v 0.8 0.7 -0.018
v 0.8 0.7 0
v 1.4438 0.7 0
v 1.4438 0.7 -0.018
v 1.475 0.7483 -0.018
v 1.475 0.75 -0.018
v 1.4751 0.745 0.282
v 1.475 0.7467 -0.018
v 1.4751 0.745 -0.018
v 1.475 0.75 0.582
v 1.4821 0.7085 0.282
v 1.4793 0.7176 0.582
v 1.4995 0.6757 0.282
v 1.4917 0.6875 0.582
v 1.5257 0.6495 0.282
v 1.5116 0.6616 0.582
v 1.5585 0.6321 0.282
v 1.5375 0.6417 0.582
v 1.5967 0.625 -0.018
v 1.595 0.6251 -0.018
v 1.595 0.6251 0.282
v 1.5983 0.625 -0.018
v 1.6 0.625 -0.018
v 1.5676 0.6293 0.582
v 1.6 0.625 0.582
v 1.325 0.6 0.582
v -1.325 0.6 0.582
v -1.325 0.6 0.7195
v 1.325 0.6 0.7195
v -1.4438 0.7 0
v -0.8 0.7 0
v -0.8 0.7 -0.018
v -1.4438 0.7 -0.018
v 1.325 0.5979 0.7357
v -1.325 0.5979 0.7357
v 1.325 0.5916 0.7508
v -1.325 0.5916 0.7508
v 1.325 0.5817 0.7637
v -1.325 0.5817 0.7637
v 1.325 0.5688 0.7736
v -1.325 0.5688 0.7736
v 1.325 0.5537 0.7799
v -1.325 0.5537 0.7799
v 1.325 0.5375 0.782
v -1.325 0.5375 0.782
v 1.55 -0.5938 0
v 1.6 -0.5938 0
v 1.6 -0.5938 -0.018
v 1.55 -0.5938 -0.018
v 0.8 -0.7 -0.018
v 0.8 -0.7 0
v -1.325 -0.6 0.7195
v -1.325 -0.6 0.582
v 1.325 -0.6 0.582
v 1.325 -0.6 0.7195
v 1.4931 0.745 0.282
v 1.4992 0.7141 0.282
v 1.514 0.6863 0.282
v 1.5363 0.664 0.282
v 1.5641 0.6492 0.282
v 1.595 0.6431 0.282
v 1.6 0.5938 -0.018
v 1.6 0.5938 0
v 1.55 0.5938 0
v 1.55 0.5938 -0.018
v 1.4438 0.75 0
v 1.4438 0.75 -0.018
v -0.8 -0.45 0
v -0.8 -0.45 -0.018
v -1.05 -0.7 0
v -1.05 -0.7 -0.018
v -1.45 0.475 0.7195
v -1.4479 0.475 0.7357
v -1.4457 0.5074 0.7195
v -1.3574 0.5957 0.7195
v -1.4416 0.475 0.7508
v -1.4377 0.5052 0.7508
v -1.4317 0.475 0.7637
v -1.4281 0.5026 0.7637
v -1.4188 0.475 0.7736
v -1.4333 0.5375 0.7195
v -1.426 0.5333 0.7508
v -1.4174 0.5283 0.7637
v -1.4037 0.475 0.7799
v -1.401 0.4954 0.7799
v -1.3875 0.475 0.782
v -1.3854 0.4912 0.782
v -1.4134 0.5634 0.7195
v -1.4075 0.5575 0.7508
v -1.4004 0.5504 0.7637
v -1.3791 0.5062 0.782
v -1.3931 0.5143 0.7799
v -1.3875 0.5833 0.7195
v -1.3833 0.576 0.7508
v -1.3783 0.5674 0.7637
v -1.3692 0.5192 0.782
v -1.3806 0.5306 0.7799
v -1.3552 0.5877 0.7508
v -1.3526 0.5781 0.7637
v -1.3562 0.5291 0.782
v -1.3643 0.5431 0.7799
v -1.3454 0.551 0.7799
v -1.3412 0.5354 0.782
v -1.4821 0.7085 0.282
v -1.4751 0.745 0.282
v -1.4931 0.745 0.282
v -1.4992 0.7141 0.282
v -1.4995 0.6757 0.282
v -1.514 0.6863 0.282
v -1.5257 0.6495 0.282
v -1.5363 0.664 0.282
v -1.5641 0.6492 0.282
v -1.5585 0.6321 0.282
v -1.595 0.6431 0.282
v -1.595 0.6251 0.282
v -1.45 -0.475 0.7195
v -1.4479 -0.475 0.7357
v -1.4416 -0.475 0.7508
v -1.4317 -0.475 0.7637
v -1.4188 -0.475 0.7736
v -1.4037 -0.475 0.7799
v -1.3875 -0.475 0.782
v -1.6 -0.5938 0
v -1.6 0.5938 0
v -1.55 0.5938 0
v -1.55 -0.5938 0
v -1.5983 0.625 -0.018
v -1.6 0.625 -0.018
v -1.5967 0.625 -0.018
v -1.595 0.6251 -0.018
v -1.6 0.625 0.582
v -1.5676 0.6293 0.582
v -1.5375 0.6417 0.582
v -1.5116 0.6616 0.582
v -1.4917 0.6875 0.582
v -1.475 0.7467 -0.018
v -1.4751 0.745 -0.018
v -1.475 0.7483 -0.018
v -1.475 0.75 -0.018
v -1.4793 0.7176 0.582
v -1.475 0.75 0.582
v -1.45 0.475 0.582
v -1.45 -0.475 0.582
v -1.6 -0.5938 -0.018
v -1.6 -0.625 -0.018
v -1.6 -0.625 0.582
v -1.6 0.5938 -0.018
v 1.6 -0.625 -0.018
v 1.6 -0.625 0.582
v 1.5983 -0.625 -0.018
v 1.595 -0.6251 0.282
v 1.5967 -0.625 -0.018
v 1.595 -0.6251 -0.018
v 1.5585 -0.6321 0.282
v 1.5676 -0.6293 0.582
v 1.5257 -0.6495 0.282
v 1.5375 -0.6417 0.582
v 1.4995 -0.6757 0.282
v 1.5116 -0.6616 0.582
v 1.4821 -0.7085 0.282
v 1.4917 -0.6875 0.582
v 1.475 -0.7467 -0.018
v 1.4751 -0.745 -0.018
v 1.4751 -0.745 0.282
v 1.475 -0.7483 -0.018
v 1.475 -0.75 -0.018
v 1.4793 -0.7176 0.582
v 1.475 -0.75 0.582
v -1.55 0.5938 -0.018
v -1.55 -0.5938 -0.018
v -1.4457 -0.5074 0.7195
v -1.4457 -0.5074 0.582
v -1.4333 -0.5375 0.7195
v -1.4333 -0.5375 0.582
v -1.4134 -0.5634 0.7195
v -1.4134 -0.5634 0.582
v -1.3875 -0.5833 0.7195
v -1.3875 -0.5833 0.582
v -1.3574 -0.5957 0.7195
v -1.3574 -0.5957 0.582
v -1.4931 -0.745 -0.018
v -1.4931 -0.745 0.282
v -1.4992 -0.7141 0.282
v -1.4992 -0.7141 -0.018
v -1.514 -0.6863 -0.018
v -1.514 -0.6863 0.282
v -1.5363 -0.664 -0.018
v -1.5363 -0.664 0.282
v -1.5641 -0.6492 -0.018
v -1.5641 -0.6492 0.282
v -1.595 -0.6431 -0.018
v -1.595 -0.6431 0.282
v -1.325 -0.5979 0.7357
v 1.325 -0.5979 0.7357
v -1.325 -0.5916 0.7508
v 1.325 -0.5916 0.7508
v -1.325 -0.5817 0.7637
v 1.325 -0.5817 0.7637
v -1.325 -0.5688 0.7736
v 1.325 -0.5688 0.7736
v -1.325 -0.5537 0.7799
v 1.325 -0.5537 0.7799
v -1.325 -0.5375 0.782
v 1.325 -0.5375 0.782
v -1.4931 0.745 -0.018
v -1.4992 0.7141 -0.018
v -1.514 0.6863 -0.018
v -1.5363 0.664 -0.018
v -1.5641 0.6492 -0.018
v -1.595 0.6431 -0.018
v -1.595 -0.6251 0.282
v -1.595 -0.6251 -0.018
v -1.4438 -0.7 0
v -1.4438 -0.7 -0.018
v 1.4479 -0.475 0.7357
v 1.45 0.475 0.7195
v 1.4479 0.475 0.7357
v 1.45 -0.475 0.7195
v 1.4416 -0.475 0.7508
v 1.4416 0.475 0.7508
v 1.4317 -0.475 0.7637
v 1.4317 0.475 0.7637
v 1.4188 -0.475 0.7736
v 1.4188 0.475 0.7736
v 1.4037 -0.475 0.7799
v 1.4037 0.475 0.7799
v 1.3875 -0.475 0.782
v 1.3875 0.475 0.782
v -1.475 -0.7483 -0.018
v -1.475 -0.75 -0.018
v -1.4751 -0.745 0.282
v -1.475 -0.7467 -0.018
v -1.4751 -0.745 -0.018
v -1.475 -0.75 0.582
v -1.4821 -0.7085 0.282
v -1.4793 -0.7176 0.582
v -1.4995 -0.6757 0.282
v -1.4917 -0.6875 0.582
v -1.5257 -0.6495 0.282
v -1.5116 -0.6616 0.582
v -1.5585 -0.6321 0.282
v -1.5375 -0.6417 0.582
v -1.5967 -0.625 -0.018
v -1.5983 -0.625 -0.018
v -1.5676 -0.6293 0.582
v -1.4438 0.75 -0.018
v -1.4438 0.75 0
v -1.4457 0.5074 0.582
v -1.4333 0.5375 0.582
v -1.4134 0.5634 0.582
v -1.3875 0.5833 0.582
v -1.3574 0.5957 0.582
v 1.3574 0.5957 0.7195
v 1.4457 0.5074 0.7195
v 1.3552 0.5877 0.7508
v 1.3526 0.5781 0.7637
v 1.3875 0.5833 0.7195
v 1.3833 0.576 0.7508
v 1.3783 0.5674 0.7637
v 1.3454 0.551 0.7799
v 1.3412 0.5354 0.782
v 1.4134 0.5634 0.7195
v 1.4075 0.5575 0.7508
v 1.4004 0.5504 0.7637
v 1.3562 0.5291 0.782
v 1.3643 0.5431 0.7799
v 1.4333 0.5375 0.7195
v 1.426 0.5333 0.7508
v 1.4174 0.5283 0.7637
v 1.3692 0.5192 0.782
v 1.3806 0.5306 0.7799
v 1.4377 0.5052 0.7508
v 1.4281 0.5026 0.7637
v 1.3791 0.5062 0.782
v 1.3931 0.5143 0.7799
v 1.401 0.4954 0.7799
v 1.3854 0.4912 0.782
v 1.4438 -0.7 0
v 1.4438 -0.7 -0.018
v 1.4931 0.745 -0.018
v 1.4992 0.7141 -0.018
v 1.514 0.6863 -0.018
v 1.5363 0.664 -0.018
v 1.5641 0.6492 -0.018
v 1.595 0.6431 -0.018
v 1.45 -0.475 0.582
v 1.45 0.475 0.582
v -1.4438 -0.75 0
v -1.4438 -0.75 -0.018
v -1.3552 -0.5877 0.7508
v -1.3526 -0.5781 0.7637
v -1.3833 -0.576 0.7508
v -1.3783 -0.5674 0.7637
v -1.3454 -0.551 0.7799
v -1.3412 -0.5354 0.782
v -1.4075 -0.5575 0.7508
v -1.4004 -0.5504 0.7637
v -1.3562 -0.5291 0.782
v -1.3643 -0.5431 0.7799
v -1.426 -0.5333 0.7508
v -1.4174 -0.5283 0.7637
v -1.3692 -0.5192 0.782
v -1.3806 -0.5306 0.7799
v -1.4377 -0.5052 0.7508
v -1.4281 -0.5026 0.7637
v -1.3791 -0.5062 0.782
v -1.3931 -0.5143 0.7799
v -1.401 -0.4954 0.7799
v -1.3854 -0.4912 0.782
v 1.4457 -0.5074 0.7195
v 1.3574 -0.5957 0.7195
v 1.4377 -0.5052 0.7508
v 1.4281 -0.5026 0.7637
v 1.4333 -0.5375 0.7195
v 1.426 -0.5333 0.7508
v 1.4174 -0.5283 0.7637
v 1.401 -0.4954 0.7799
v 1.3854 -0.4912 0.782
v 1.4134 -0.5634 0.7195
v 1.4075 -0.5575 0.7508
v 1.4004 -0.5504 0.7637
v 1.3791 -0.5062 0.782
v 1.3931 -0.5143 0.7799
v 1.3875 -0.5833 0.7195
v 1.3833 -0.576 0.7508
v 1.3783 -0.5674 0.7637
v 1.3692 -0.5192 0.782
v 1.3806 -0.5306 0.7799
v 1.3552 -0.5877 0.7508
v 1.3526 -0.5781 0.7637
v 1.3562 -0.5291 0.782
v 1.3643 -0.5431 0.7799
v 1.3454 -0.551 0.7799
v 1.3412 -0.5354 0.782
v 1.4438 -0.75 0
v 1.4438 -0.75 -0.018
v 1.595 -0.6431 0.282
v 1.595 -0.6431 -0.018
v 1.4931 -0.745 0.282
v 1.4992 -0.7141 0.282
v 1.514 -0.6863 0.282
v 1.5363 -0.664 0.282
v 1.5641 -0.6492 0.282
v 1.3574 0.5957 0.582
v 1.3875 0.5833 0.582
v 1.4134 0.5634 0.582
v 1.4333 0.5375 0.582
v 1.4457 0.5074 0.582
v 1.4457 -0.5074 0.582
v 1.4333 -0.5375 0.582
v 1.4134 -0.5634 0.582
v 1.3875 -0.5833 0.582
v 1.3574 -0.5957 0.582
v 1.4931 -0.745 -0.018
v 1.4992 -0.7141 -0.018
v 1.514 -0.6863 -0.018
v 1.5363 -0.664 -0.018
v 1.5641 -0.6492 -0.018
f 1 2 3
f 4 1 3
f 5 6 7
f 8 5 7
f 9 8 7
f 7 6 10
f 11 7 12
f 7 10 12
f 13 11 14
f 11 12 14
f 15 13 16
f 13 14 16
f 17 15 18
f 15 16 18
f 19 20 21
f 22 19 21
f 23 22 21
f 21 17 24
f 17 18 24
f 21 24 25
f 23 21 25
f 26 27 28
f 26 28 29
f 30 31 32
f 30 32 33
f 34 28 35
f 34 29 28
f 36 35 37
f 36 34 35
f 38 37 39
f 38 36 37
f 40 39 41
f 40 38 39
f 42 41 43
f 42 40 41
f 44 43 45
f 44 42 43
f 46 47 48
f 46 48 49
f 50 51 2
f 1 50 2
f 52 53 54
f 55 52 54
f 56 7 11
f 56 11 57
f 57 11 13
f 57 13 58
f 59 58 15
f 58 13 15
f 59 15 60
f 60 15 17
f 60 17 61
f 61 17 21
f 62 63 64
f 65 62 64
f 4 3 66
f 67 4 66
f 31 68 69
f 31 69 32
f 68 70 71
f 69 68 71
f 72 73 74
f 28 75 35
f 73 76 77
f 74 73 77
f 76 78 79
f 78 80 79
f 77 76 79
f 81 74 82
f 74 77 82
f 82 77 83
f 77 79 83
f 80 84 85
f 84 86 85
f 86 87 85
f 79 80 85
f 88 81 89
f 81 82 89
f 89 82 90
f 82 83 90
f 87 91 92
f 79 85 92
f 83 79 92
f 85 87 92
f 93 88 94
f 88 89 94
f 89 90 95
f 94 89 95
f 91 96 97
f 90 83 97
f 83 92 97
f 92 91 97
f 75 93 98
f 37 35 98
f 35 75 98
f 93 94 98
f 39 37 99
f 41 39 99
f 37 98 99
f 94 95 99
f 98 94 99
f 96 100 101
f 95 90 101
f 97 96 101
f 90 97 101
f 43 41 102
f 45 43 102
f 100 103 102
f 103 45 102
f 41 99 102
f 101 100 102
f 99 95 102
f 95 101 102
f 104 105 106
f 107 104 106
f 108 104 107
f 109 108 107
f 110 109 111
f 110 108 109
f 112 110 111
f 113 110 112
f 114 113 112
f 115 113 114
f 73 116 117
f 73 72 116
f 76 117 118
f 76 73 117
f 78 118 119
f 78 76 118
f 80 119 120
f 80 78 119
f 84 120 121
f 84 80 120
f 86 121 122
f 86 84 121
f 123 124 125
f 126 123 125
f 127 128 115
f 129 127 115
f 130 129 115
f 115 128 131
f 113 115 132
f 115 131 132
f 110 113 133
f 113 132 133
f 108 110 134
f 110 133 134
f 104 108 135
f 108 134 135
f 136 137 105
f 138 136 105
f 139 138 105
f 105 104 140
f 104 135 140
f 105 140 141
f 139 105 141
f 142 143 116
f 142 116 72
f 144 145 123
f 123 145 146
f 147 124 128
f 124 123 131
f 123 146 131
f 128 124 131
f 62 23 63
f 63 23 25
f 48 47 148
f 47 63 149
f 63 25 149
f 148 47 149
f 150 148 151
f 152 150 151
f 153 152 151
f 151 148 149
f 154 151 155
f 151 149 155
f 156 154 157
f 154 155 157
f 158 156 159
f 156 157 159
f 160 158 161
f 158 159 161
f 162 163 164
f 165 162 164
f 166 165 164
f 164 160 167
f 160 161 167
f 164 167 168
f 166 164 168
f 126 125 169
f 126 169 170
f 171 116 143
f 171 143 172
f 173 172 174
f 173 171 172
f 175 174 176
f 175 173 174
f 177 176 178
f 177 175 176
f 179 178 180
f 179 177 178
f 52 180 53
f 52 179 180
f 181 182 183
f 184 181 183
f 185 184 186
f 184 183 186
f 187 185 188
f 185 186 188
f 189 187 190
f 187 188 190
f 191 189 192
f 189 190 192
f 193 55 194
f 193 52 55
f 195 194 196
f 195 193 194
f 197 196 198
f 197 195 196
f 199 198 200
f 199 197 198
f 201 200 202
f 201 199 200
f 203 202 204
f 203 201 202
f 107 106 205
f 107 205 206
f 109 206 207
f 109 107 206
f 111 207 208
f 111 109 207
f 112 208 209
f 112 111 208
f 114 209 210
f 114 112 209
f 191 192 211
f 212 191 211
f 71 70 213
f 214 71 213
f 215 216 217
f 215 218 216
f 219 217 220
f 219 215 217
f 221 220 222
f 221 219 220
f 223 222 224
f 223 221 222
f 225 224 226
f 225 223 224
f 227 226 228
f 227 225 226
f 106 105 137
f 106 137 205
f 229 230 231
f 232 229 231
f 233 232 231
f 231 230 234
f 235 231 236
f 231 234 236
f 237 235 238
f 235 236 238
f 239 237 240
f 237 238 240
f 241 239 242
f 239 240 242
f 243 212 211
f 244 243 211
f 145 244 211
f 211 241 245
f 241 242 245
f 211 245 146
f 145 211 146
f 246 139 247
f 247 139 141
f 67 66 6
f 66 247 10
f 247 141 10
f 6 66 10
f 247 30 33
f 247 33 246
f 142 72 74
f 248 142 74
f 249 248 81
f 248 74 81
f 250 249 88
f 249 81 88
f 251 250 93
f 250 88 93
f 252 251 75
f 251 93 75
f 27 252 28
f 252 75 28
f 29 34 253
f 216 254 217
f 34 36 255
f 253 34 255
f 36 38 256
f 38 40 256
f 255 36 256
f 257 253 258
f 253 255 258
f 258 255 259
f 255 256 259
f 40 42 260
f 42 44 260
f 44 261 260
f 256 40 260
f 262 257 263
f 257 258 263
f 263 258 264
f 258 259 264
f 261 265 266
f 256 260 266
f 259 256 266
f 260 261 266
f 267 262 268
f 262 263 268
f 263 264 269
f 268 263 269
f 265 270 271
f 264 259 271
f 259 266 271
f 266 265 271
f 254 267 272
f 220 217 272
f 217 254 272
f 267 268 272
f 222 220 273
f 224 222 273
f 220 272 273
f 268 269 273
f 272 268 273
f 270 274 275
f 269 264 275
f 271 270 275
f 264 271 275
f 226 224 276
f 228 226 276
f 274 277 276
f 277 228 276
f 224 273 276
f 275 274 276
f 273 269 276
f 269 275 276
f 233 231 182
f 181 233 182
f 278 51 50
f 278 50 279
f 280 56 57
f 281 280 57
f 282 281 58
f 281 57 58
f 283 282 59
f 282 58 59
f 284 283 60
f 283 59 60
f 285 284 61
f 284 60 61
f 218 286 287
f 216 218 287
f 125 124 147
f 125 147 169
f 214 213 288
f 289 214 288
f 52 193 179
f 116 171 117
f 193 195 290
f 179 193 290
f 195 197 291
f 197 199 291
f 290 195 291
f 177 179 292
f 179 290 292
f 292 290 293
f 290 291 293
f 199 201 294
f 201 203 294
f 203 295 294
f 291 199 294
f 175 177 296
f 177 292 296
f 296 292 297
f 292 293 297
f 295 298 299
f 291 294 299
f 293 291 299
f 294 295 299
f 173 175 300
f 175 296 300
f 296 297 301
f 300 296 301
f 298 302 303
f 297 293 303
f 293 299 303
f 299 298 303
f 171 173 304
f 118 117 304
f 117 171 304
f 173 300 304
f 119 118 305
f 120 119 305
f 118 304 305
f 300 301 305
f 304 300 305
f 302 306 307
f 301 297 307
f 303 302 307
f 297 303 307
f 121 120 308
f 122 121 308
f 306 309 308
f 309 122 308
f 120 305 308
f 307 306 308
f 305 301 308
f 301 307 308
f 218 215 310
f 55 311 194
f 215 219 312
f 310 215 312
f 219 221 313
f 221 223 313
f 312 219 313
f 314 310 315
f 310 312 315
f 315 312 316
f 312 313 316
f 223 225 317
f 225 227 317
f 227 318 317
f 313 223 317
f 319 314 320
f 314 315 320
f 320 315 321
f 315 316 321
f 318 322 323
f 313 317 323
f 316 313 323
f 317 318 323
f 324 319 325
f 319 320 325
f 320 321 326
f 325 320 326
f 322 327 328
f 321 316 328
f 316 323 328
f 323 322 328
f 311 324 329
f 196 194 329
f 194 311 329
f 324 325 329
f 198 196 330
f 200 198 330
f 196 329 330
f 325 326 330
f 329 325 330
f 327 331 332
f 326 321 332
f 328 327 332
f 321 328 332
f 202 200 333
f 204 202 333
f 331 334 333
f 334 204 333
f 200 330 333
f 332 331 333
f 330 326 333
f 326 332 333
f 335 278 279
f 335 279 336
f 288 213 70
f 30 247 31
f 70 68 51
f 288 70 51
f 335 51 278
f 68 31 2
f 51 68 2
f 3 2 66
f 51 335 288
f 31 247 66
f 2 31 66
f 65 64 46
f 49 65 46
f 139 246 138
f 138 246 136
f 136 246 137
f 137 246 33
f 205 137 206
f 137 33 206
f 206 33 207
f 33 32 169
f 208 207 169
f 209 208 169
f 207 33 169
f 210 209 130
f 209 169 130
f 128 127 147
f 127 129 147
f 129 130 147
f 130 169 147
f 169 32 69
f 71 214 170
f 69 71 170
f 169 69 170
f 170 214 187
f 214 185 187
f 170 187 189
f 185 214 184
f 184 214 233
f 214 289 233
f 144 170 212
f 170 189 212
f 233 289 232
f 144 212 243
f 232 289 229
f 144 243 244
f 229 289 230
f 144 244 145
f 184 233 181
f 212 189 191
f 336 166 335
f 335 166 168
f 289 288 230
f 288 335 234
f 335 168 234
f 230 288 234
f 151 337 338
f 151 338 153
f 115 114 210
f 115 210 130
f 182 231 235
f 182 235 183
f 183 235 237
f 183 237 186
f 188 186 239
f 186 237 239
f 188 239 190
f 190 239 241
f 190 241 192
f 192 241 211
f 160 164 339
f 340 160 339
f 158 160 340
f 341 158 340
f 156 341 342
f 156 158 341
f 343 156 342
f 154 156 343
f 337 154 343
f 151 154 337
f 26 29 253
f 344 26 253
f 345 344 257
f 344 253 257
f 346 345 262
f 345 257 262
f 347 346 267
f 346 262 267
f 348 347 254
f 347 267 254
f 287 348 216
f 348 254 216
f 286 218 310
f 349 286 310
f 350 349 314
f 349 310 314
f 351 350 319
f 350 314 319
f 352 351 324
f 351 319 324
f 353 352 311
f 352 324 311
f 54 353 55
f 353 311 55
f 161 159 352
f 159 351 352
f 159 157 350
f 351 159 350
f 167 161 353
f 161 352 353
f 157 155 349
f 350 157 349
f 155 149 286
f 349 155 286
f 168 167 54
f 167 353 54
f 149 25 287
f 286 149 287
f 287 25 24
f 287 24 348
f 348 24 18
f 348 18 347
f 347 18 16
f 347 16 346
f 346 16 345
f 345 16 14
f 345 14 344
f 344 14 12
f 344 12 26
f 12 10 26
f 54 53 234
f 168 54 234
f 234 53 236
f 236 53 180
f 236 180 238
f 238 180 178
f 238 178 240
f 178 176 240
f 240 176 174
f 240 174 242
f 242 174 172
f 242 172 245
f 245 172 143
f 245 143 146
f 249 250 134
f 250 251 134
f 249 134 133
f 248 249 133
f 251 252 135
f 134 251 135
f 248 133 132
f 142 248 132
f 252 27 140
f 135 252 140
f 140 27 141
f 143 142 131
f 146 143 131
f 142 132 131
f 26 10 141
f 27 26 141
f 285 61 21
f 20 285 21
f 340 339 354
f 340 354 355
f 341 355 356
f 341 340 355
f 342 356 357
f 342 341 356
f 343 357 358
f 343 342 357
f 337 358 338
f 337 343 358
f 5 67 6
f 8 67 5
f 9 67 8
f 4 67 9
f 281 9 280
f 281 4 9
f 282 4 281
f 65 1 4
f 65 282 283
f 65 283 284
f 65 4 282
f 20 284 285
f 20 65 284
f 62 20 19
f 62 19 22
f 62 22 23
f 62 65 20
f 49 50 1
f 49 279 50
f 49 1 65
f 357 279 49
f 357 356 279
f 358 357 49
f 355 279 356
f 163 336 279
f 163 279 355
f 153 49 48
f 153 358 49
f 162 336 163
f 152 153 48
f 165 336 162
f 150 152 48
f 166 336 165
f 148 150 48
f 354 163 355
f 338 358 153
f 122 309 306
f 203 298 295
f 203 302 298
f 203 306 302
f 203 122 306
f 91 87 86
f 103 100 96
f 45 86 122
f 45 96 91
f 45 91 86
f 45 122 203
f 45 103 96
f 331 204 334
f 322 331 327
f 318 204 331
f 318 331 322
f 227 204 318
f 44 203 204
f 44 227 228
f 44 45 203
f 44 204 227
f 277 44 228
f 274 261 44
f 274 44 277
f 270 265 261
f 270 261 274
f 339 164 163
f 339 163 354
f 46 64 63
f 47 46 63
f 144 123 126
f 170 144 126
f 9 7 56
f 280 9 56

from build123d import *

# Parameters (mm, degrees)
SKETCH1_W               = 3.2
SKETCH1_H               = 1.5
BOSS_EXTRUDE1_DEPTH     = 0.564
BOSS_EXTRUDE2_DEPTH     = 0.018
MIRROR5_COPY_1_DEPTH    = 0.018
CUT_EXTRUDE1_DEPTH      = 2.854884363
CUT_EXTRUDE1_DEPTH_BACK = 2.854884363
BOSS_EXTRUDE3_START     = -0.282
BOSS_EXTRUDE3_DEPTH     = 0.3
MIRROR2_START           = -0.282
MIRROR2_COPY_1_DEPTH    = 0.3
BOSS_EXTRUDE4_START     = 0.018
BOSS_EXTRUDE4_DEPTH     = 0.018
SKETCH8_W               = 2.9
SKETCH8_H               = 1.2
BOSS_EXTRUDE5_DEPTH     = 0.2
FILLET1_R               = 0.125
FILLET2_R               = 0.0625
CHAMFER1_SIZE           = 0.25


with BuildPart() as part:
    # Sketch1 → Boss-Extrude1 (new body)
    with BuildSketch(Plane.XY):
        Rectangle(SKETCH1_W, SKETCH1_H)
    extrude(amount=BOSS_EXTRUDE1_DEPTH)

    # Sketch2 → Boss-Extrude2 (add)
    with BuildSketch(Plane(origin=(0, 0, 0), x_dir=(-1, 0, 0), z_dir=(0, 0, -1))):
        Polygon((0.8, -0.7), (1.44375, -0.7), (1.44375, -0.75), (1.6, -0.75), (1.6, -0.59375), (1.55, -0.59375), (1.55, 0), (0.8, 0), align=None)
    boss_extrude2 = extrude(amount=BOSS_EXTRUDE2_DEPTH)

    # Mirror4: Boss-Extrude2 across plane
    add(boss_extrude2.mirror(Plane.ZX))

    # Mirror5: Boss-Extrude2 across plane
    add(boss_extrude2.mirror(Plane(origin=(0, 0, 0), x_dir=(0, 0, 1), z_dir=(1, 0, 0))))

    # Mirror5 copy 1 sketch → Mirror5 copy 1 (add)
    with BuildSketch(Plane(origin=(0, 0, 0), x_dir=(1, 0, 0), z_dir=(0, 0, -1))):
        Polygon((0.8, -0.7), (1.44375, -0.7), (1.44375, -0.75), (1.6, -0.75), (1.6, -0.59375), (1.55, -0.59375), (1.55, 0), (0.8, 0), align=None)
    extrude(amount=MIRROR5_COPY_1_DEPTH)

    # Sketch3 → Cut-Extrude1 (cut, two sides: drawn at the far end of the back side and taken through both)
    with BuildSketch(Plane(origin=(0, 0, 0), x_dir=(-1, 0, 0), z_dir=(0, 0, -1)).offset(-CUT_EXTRUDE1_DEPTH_BACK)):
        with BuildLine():
            Line((1.6, 0.625), (1.6, 0.75))
            Line((1.6, 0.75), (1.475, 0.75))
            ThreePointArc((1.475, 0.75), (1.511611652, 0.661611652), (1.6, 0.625))
        make_face()
        with BuildLine():
            Line((-1.475, 0.75), (-1.6, 0.75))
            Line((-1.6, 0.75), (-1.6, 0.625))
            ThreePointArc((-1.6, 0.625), (-1.511611652, 0.661611652), (-1.475, 0.75))
        make_face()
        with BuildLine():
            Line((-1.6, -0.625), (-1.6, -0.75))
            Line((-1.6, -0.75), (-1.475, -0.75))
            ThreePointArc((-1.475, -0.75), (-1.511611652, -0.661611652), (-1.6, -0.625))
        make_face()
        with BuildLine():
            Line((1.6, -0.625), (1.6, -0.75))
            Line((1.6, -0.75), (1.475, -0.75))
            ThreePointArc((1.475, -0.75), (1.511611652, -0.661611652), (1.6, -0.625))
        make_face()
    extrude(amount=CUT_EXTRUDE1_DEPTH + CUT_EXTRUDE1_DEPTH_BACK, mode=Mode.SUBTRACT)

    # Sketch5 → Boss-Extrude3 (add)
    with BuildSketch(Plane(origin=(0, 0, 0), x_dir=(-1, 0, 0), z_dir=(0, 0, -1)).offset(BOSS_EXTRUDE3_START)):
        with BuildLine():
            Line((1.47510004, -0.745), (1.493116886, -0.745))
            ThreePointArc((1.493116886, -0.745), (1.524339574, -0.674339574), (1.595, -0.643116886))
            Line((1.595, -0.643116886), (1.595, -0.62510004))
            ThreePointArc((1.595, -0.62510004), (1.511611652, -0.661611652), (1.47510004, -0.745))
        make_face()
    boss_extrude3 = extrude(amount=BOSS_EXTRUDE3_DEPTH)

    # Mirror1: Boss-Extrude3 across plane
    add(boss_extrude3.mirror(Plane(origin=(0, 0, 0), x_dir=(0, 0, 1), z_dir=(1, 0, 0))))

    # Mirror2: Boss-Extrude3 across plane
    add(boss_extrude3.mirror(Plane.ZX))

    # Mirror2 copy 1 sketch → Mirror2 copy 1 (add)
    with BuildSketch(Plane(origin=(0, 0, 0), x_dir=(1, 0, 0), z_dir=(0, 0, -1)).offset(MIRROR2_START)):
        with BuildLine():
            Line((1.47510004, -0.745), (1.493116886, -0.745))
            ThreePointArc((1.493116886, -0.745), (1.524339574, -0.674339574), (1.595, -0.643116886))
            Line((1.595, -0.643116886), (1.595, -0.62510004))
            ThreePointArc((1.595, -0.62510004), (1.511611652, -0.661611652), (1.47510004, -0.745))
        make_face()
    extrude(amount=MIRROR2_COPY_1_DEPTH)

    # Sketch7 → Boss-Extrude4 (add)
    with BuildSketch(Plane.XY.offset(0.564).offset(BOSS_EXTRUDE4_START)):
        with BuildLine():
            Line((-1.475, 0.75), (1.475, 0.75))
            ThreePointArc((1.475, 0.75), (1.511611652, 0.661611652), (1.6, 0.625))
            Line((1.6, 0.625), (1.6, -0.625))
            ThreePointArc((1.6, -0.625), (1.511611652, -0.661611652), (1.475, -0.75))
            Line((1.475, -0.75), (-1.475, -0.75))
            ThreePointArc((-1.475, -0.75), (-1.511611652, -0.661611652), (-1.6, -0.625))
            Line((-1.6, -0.625), (-1.6, 0.625))
            ThreePointArc((-1.6, 0.625), (-1.511611652, 0.661611652), (-1.475, 0.75))
        make_face()
    extrude(amount=-BOSS_EXTRUDE4_DEPTH)

    # Sketch8 → Boss-Extrude5 (add)
    with BuildSketch(Plane.XY.offset(0.582)):
        Rectangle(SKETCH8_W, SKETCH8_H)
    extrude(amount=BOSS_EXTRUDE5_DEPTH)

    # Fillet1
    fillet1_edges = [part.edges().sort_by_distance(p)[0] for p in [
        (1.45, -0.6, 0.682),
        (1.45, 0.6, 0.682),
        (-1.45, 0.6, 0.682),
        (-1.45, -0.6, 0.682),
    ]]
    fillet(fillet1_edges, radius=FILLET1_R)

    # Fillet2
    fillet2_edges = [part.edges().sort_by_distance(p)[0] for p in [
        (-1.45, 0, 0.782),
        (0, 0.6, 0.782),
        (1.45, 0, 0.782),
        (0, -0.6, 0.782),
        (-1.413388348, -0.563388348, 0.782),
        (1.413388348, -0.563388348, 0.782),
        (1.413388348, 0.563388348, 0.782),
        (-1.413388348, 0.563388348, 0.782),
    ]]
    fillet(fillet2_edges, radius=FILLET2_R)

    # Chamfer1
    chamfer1_edges = [part.edges().sort_by_distance(p)[0] for p in [
        (-0.8, -0.7, -0.009),
    ]]
    chamfer(chamfer1_edges, length=CHAMFER1_SIZE)


solid = part.part
